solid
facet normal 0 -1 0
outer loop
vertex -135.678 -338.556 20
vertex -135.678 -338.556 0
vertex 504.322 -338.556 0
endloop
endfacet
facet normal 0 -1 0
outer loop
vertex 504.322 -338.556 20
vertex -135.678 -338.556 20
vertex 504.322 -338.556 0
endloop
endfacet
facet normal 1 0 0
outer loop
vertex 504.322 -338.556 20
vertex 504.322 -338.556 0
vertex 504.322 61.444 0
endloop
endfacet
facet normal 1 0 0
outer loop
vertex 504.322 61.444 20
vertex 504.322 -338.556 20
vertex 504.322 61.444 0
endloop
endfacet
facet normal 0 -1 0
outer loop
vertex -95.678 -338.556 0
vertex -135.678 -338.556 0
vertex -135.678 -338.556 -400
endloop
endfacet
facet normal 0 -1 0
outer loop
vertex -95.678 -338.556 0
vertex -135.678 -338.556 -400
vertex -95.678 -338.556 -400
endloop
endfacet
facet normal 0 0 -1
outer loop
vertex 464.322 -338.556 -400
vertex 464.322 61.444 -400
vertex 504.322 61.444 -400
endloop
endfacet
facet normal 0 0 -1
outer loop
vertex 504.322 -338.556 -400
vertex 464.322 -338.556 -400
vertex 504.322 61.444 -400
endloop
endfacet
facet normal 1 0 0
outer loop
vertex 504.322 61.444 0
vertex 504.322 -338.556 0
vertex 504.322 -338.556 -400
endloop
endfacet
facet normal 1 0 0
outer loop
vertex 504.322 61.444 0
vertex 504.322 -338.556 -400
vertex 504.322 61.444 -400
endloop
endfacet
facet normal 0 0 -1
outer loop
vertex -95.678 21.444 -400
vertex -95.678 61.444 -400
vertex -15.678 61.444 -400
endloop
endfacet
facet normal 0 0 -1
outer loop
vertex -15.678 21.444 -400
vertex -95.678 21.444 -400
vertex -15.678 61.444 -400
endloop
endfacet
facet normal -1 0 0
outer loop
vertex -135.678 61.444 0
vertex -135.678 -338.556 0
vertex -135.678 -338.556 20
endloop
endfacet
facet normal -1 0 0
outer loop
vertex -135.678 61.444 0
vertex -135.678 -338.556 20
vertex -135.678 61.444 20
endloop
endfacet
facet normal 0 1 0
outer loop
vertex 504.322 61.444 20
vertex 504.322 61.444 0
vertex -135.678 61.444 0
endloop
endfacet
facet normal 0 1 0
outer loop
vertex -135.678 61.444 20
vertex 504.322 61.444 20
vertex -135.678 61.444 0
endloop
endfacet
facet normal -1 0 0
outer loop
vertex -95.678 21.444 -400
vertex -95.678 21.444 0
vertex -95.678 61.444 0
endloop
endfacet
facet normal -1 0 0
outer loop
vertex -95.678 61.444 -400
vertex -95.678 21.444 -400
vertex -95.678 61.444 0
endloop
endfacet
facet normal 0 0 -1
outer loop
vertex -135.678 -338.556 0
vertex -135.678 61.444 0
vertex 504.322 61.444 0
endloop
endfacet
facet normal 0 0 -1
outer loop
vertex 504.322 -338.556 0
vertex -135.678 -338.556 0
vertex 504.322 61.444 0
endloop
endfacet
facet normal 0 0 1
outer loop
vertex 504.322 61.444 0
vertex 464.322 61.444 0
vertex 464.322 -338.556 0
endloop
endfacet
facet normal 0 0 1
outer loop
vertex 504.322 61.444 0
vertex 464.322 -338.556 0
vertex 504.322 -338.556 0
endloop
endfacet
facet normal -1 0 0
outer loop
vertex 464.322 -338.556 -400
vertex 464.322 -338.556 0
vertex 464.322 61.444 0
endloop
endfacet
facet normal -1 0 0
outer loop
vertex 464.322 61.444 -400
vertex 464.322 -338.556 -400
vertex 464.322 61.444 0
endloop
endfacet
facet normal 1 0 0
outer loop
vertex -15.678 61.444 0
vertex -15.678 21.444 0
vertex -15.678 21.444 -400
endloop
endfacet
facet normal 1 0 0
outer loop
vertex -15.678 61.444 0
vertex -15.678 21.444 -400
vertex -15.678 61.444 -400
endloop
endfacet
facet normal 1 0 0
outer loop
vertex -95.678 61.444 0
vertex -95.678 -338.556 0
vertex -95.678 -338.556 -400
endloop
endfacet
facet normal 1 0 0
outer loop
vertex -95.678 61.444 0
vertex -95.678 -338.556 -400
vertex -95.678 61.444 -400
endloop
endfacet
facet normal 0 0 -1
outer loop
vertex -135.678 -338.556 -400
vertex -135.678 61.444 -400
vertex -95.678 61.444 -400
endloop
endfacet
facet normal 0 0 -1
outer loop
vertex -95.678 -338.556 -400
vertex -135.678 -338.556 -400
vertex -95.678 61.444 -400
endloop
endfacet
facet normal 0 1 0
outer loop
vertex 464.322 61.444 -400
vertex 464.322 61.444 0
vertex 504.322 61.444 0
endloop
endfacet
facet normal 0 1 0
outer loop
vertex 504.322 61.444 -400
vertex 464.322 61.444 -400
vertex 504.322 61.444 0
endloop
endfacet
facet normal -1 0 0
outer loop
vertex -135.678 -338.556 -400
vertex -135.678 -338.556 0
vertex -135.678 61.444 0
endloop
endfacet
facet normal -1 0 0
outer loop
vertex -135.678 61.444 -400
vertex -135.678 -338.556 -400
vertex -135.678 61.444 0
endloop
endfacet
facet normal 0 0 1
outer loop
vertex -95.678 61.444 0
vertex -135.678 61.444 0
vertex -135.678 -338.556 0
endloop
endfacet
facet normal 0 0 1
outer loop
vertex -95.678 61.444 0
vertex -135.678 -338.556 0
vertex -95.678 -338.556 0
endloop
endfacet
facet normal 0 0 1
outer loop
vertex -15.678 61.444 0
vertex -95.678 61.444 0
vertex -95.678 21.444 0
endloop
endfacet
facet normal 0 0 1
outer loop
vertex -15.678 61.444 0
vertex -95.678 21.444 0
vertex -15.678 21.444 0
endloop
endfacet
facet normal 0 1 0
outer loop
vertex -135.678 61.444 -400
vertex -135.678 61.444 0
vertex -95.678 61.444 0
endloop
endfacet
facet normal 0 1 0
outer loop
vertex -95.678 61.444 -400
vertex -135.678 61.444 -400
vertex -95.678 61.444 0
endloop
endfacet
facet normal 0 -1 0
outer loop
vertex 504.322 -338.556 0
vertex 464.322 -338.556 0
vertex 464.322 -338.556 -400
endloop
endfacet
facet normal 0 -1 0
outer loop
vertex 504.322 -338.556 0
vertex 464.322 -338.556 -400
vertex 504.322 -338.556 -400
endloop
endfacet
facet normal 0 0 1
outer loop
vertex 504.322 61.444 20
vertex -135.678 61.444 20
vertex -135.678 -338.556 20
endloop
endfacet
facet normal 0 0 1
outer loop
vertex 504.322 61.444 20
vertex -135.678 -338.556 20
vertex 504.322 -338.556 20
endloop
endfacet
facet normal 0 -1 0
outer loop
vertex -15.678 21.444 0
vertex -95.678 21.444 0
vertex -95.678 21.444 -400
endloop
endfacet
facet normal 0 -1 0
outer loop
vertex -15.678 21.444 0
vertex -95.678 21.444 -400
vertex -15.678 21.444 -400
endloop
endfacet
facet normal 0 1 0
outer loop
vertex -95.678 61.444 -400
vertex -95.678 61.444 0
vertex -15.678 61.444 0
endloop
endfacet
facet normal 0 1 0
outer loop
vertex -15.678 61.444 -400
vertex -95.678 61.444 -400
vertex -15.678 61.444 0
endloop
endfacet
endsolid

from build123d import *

# Parameters (mm, degrees)
F0_W     = 560
F0_H     = 400
F0_W_2   = 40
F1_DEPTH = 20
F2_DEPTH = 400
F3_W     = 80
F3_H     = 40
F4_DEPTH = 400


with BuildPart() as f1:
    # F0 (on Top) → F1 (new body)
    with BuildSketch(Plane.XY):
        with Locations((184.322051, -138.555664)):
            Rectangle(F0_W, F0_H)
        with Locations((-115.677949, -138.555664)):
            Rectangle(F0_W_2, F0_H)
        with Locations((484.322051, -138.555664)):
            Rectangle(F0_W_2, F0_H)
    extrude(amount=F1_DEPTH)


with BuildPart() as f2:
    # F0 (on Top) → F2 (new body)
    with BuildSketch(Plane.XY):
        with Locations((-115.677949, -138.555664)):
            Rectangle(F0_W_2, F0_H)
        with Locations((484.322051, -138.555664)):
            Rectangle(F0_W_2, F0_H)
    extrude(amount=-F2_DEPTH)


with BuildPart() as f4:
    # F3 (on face) → F4 (new body, through all)
    with BuildSketch(Plane.XY):
        with Locations((-55.677949, 41.444336)):
            Rectangle(F3_W, F3_H)
    extrude(amount=-F4_DEPTH)


solid = Compound([f1.part, f2.part, f4.part])
